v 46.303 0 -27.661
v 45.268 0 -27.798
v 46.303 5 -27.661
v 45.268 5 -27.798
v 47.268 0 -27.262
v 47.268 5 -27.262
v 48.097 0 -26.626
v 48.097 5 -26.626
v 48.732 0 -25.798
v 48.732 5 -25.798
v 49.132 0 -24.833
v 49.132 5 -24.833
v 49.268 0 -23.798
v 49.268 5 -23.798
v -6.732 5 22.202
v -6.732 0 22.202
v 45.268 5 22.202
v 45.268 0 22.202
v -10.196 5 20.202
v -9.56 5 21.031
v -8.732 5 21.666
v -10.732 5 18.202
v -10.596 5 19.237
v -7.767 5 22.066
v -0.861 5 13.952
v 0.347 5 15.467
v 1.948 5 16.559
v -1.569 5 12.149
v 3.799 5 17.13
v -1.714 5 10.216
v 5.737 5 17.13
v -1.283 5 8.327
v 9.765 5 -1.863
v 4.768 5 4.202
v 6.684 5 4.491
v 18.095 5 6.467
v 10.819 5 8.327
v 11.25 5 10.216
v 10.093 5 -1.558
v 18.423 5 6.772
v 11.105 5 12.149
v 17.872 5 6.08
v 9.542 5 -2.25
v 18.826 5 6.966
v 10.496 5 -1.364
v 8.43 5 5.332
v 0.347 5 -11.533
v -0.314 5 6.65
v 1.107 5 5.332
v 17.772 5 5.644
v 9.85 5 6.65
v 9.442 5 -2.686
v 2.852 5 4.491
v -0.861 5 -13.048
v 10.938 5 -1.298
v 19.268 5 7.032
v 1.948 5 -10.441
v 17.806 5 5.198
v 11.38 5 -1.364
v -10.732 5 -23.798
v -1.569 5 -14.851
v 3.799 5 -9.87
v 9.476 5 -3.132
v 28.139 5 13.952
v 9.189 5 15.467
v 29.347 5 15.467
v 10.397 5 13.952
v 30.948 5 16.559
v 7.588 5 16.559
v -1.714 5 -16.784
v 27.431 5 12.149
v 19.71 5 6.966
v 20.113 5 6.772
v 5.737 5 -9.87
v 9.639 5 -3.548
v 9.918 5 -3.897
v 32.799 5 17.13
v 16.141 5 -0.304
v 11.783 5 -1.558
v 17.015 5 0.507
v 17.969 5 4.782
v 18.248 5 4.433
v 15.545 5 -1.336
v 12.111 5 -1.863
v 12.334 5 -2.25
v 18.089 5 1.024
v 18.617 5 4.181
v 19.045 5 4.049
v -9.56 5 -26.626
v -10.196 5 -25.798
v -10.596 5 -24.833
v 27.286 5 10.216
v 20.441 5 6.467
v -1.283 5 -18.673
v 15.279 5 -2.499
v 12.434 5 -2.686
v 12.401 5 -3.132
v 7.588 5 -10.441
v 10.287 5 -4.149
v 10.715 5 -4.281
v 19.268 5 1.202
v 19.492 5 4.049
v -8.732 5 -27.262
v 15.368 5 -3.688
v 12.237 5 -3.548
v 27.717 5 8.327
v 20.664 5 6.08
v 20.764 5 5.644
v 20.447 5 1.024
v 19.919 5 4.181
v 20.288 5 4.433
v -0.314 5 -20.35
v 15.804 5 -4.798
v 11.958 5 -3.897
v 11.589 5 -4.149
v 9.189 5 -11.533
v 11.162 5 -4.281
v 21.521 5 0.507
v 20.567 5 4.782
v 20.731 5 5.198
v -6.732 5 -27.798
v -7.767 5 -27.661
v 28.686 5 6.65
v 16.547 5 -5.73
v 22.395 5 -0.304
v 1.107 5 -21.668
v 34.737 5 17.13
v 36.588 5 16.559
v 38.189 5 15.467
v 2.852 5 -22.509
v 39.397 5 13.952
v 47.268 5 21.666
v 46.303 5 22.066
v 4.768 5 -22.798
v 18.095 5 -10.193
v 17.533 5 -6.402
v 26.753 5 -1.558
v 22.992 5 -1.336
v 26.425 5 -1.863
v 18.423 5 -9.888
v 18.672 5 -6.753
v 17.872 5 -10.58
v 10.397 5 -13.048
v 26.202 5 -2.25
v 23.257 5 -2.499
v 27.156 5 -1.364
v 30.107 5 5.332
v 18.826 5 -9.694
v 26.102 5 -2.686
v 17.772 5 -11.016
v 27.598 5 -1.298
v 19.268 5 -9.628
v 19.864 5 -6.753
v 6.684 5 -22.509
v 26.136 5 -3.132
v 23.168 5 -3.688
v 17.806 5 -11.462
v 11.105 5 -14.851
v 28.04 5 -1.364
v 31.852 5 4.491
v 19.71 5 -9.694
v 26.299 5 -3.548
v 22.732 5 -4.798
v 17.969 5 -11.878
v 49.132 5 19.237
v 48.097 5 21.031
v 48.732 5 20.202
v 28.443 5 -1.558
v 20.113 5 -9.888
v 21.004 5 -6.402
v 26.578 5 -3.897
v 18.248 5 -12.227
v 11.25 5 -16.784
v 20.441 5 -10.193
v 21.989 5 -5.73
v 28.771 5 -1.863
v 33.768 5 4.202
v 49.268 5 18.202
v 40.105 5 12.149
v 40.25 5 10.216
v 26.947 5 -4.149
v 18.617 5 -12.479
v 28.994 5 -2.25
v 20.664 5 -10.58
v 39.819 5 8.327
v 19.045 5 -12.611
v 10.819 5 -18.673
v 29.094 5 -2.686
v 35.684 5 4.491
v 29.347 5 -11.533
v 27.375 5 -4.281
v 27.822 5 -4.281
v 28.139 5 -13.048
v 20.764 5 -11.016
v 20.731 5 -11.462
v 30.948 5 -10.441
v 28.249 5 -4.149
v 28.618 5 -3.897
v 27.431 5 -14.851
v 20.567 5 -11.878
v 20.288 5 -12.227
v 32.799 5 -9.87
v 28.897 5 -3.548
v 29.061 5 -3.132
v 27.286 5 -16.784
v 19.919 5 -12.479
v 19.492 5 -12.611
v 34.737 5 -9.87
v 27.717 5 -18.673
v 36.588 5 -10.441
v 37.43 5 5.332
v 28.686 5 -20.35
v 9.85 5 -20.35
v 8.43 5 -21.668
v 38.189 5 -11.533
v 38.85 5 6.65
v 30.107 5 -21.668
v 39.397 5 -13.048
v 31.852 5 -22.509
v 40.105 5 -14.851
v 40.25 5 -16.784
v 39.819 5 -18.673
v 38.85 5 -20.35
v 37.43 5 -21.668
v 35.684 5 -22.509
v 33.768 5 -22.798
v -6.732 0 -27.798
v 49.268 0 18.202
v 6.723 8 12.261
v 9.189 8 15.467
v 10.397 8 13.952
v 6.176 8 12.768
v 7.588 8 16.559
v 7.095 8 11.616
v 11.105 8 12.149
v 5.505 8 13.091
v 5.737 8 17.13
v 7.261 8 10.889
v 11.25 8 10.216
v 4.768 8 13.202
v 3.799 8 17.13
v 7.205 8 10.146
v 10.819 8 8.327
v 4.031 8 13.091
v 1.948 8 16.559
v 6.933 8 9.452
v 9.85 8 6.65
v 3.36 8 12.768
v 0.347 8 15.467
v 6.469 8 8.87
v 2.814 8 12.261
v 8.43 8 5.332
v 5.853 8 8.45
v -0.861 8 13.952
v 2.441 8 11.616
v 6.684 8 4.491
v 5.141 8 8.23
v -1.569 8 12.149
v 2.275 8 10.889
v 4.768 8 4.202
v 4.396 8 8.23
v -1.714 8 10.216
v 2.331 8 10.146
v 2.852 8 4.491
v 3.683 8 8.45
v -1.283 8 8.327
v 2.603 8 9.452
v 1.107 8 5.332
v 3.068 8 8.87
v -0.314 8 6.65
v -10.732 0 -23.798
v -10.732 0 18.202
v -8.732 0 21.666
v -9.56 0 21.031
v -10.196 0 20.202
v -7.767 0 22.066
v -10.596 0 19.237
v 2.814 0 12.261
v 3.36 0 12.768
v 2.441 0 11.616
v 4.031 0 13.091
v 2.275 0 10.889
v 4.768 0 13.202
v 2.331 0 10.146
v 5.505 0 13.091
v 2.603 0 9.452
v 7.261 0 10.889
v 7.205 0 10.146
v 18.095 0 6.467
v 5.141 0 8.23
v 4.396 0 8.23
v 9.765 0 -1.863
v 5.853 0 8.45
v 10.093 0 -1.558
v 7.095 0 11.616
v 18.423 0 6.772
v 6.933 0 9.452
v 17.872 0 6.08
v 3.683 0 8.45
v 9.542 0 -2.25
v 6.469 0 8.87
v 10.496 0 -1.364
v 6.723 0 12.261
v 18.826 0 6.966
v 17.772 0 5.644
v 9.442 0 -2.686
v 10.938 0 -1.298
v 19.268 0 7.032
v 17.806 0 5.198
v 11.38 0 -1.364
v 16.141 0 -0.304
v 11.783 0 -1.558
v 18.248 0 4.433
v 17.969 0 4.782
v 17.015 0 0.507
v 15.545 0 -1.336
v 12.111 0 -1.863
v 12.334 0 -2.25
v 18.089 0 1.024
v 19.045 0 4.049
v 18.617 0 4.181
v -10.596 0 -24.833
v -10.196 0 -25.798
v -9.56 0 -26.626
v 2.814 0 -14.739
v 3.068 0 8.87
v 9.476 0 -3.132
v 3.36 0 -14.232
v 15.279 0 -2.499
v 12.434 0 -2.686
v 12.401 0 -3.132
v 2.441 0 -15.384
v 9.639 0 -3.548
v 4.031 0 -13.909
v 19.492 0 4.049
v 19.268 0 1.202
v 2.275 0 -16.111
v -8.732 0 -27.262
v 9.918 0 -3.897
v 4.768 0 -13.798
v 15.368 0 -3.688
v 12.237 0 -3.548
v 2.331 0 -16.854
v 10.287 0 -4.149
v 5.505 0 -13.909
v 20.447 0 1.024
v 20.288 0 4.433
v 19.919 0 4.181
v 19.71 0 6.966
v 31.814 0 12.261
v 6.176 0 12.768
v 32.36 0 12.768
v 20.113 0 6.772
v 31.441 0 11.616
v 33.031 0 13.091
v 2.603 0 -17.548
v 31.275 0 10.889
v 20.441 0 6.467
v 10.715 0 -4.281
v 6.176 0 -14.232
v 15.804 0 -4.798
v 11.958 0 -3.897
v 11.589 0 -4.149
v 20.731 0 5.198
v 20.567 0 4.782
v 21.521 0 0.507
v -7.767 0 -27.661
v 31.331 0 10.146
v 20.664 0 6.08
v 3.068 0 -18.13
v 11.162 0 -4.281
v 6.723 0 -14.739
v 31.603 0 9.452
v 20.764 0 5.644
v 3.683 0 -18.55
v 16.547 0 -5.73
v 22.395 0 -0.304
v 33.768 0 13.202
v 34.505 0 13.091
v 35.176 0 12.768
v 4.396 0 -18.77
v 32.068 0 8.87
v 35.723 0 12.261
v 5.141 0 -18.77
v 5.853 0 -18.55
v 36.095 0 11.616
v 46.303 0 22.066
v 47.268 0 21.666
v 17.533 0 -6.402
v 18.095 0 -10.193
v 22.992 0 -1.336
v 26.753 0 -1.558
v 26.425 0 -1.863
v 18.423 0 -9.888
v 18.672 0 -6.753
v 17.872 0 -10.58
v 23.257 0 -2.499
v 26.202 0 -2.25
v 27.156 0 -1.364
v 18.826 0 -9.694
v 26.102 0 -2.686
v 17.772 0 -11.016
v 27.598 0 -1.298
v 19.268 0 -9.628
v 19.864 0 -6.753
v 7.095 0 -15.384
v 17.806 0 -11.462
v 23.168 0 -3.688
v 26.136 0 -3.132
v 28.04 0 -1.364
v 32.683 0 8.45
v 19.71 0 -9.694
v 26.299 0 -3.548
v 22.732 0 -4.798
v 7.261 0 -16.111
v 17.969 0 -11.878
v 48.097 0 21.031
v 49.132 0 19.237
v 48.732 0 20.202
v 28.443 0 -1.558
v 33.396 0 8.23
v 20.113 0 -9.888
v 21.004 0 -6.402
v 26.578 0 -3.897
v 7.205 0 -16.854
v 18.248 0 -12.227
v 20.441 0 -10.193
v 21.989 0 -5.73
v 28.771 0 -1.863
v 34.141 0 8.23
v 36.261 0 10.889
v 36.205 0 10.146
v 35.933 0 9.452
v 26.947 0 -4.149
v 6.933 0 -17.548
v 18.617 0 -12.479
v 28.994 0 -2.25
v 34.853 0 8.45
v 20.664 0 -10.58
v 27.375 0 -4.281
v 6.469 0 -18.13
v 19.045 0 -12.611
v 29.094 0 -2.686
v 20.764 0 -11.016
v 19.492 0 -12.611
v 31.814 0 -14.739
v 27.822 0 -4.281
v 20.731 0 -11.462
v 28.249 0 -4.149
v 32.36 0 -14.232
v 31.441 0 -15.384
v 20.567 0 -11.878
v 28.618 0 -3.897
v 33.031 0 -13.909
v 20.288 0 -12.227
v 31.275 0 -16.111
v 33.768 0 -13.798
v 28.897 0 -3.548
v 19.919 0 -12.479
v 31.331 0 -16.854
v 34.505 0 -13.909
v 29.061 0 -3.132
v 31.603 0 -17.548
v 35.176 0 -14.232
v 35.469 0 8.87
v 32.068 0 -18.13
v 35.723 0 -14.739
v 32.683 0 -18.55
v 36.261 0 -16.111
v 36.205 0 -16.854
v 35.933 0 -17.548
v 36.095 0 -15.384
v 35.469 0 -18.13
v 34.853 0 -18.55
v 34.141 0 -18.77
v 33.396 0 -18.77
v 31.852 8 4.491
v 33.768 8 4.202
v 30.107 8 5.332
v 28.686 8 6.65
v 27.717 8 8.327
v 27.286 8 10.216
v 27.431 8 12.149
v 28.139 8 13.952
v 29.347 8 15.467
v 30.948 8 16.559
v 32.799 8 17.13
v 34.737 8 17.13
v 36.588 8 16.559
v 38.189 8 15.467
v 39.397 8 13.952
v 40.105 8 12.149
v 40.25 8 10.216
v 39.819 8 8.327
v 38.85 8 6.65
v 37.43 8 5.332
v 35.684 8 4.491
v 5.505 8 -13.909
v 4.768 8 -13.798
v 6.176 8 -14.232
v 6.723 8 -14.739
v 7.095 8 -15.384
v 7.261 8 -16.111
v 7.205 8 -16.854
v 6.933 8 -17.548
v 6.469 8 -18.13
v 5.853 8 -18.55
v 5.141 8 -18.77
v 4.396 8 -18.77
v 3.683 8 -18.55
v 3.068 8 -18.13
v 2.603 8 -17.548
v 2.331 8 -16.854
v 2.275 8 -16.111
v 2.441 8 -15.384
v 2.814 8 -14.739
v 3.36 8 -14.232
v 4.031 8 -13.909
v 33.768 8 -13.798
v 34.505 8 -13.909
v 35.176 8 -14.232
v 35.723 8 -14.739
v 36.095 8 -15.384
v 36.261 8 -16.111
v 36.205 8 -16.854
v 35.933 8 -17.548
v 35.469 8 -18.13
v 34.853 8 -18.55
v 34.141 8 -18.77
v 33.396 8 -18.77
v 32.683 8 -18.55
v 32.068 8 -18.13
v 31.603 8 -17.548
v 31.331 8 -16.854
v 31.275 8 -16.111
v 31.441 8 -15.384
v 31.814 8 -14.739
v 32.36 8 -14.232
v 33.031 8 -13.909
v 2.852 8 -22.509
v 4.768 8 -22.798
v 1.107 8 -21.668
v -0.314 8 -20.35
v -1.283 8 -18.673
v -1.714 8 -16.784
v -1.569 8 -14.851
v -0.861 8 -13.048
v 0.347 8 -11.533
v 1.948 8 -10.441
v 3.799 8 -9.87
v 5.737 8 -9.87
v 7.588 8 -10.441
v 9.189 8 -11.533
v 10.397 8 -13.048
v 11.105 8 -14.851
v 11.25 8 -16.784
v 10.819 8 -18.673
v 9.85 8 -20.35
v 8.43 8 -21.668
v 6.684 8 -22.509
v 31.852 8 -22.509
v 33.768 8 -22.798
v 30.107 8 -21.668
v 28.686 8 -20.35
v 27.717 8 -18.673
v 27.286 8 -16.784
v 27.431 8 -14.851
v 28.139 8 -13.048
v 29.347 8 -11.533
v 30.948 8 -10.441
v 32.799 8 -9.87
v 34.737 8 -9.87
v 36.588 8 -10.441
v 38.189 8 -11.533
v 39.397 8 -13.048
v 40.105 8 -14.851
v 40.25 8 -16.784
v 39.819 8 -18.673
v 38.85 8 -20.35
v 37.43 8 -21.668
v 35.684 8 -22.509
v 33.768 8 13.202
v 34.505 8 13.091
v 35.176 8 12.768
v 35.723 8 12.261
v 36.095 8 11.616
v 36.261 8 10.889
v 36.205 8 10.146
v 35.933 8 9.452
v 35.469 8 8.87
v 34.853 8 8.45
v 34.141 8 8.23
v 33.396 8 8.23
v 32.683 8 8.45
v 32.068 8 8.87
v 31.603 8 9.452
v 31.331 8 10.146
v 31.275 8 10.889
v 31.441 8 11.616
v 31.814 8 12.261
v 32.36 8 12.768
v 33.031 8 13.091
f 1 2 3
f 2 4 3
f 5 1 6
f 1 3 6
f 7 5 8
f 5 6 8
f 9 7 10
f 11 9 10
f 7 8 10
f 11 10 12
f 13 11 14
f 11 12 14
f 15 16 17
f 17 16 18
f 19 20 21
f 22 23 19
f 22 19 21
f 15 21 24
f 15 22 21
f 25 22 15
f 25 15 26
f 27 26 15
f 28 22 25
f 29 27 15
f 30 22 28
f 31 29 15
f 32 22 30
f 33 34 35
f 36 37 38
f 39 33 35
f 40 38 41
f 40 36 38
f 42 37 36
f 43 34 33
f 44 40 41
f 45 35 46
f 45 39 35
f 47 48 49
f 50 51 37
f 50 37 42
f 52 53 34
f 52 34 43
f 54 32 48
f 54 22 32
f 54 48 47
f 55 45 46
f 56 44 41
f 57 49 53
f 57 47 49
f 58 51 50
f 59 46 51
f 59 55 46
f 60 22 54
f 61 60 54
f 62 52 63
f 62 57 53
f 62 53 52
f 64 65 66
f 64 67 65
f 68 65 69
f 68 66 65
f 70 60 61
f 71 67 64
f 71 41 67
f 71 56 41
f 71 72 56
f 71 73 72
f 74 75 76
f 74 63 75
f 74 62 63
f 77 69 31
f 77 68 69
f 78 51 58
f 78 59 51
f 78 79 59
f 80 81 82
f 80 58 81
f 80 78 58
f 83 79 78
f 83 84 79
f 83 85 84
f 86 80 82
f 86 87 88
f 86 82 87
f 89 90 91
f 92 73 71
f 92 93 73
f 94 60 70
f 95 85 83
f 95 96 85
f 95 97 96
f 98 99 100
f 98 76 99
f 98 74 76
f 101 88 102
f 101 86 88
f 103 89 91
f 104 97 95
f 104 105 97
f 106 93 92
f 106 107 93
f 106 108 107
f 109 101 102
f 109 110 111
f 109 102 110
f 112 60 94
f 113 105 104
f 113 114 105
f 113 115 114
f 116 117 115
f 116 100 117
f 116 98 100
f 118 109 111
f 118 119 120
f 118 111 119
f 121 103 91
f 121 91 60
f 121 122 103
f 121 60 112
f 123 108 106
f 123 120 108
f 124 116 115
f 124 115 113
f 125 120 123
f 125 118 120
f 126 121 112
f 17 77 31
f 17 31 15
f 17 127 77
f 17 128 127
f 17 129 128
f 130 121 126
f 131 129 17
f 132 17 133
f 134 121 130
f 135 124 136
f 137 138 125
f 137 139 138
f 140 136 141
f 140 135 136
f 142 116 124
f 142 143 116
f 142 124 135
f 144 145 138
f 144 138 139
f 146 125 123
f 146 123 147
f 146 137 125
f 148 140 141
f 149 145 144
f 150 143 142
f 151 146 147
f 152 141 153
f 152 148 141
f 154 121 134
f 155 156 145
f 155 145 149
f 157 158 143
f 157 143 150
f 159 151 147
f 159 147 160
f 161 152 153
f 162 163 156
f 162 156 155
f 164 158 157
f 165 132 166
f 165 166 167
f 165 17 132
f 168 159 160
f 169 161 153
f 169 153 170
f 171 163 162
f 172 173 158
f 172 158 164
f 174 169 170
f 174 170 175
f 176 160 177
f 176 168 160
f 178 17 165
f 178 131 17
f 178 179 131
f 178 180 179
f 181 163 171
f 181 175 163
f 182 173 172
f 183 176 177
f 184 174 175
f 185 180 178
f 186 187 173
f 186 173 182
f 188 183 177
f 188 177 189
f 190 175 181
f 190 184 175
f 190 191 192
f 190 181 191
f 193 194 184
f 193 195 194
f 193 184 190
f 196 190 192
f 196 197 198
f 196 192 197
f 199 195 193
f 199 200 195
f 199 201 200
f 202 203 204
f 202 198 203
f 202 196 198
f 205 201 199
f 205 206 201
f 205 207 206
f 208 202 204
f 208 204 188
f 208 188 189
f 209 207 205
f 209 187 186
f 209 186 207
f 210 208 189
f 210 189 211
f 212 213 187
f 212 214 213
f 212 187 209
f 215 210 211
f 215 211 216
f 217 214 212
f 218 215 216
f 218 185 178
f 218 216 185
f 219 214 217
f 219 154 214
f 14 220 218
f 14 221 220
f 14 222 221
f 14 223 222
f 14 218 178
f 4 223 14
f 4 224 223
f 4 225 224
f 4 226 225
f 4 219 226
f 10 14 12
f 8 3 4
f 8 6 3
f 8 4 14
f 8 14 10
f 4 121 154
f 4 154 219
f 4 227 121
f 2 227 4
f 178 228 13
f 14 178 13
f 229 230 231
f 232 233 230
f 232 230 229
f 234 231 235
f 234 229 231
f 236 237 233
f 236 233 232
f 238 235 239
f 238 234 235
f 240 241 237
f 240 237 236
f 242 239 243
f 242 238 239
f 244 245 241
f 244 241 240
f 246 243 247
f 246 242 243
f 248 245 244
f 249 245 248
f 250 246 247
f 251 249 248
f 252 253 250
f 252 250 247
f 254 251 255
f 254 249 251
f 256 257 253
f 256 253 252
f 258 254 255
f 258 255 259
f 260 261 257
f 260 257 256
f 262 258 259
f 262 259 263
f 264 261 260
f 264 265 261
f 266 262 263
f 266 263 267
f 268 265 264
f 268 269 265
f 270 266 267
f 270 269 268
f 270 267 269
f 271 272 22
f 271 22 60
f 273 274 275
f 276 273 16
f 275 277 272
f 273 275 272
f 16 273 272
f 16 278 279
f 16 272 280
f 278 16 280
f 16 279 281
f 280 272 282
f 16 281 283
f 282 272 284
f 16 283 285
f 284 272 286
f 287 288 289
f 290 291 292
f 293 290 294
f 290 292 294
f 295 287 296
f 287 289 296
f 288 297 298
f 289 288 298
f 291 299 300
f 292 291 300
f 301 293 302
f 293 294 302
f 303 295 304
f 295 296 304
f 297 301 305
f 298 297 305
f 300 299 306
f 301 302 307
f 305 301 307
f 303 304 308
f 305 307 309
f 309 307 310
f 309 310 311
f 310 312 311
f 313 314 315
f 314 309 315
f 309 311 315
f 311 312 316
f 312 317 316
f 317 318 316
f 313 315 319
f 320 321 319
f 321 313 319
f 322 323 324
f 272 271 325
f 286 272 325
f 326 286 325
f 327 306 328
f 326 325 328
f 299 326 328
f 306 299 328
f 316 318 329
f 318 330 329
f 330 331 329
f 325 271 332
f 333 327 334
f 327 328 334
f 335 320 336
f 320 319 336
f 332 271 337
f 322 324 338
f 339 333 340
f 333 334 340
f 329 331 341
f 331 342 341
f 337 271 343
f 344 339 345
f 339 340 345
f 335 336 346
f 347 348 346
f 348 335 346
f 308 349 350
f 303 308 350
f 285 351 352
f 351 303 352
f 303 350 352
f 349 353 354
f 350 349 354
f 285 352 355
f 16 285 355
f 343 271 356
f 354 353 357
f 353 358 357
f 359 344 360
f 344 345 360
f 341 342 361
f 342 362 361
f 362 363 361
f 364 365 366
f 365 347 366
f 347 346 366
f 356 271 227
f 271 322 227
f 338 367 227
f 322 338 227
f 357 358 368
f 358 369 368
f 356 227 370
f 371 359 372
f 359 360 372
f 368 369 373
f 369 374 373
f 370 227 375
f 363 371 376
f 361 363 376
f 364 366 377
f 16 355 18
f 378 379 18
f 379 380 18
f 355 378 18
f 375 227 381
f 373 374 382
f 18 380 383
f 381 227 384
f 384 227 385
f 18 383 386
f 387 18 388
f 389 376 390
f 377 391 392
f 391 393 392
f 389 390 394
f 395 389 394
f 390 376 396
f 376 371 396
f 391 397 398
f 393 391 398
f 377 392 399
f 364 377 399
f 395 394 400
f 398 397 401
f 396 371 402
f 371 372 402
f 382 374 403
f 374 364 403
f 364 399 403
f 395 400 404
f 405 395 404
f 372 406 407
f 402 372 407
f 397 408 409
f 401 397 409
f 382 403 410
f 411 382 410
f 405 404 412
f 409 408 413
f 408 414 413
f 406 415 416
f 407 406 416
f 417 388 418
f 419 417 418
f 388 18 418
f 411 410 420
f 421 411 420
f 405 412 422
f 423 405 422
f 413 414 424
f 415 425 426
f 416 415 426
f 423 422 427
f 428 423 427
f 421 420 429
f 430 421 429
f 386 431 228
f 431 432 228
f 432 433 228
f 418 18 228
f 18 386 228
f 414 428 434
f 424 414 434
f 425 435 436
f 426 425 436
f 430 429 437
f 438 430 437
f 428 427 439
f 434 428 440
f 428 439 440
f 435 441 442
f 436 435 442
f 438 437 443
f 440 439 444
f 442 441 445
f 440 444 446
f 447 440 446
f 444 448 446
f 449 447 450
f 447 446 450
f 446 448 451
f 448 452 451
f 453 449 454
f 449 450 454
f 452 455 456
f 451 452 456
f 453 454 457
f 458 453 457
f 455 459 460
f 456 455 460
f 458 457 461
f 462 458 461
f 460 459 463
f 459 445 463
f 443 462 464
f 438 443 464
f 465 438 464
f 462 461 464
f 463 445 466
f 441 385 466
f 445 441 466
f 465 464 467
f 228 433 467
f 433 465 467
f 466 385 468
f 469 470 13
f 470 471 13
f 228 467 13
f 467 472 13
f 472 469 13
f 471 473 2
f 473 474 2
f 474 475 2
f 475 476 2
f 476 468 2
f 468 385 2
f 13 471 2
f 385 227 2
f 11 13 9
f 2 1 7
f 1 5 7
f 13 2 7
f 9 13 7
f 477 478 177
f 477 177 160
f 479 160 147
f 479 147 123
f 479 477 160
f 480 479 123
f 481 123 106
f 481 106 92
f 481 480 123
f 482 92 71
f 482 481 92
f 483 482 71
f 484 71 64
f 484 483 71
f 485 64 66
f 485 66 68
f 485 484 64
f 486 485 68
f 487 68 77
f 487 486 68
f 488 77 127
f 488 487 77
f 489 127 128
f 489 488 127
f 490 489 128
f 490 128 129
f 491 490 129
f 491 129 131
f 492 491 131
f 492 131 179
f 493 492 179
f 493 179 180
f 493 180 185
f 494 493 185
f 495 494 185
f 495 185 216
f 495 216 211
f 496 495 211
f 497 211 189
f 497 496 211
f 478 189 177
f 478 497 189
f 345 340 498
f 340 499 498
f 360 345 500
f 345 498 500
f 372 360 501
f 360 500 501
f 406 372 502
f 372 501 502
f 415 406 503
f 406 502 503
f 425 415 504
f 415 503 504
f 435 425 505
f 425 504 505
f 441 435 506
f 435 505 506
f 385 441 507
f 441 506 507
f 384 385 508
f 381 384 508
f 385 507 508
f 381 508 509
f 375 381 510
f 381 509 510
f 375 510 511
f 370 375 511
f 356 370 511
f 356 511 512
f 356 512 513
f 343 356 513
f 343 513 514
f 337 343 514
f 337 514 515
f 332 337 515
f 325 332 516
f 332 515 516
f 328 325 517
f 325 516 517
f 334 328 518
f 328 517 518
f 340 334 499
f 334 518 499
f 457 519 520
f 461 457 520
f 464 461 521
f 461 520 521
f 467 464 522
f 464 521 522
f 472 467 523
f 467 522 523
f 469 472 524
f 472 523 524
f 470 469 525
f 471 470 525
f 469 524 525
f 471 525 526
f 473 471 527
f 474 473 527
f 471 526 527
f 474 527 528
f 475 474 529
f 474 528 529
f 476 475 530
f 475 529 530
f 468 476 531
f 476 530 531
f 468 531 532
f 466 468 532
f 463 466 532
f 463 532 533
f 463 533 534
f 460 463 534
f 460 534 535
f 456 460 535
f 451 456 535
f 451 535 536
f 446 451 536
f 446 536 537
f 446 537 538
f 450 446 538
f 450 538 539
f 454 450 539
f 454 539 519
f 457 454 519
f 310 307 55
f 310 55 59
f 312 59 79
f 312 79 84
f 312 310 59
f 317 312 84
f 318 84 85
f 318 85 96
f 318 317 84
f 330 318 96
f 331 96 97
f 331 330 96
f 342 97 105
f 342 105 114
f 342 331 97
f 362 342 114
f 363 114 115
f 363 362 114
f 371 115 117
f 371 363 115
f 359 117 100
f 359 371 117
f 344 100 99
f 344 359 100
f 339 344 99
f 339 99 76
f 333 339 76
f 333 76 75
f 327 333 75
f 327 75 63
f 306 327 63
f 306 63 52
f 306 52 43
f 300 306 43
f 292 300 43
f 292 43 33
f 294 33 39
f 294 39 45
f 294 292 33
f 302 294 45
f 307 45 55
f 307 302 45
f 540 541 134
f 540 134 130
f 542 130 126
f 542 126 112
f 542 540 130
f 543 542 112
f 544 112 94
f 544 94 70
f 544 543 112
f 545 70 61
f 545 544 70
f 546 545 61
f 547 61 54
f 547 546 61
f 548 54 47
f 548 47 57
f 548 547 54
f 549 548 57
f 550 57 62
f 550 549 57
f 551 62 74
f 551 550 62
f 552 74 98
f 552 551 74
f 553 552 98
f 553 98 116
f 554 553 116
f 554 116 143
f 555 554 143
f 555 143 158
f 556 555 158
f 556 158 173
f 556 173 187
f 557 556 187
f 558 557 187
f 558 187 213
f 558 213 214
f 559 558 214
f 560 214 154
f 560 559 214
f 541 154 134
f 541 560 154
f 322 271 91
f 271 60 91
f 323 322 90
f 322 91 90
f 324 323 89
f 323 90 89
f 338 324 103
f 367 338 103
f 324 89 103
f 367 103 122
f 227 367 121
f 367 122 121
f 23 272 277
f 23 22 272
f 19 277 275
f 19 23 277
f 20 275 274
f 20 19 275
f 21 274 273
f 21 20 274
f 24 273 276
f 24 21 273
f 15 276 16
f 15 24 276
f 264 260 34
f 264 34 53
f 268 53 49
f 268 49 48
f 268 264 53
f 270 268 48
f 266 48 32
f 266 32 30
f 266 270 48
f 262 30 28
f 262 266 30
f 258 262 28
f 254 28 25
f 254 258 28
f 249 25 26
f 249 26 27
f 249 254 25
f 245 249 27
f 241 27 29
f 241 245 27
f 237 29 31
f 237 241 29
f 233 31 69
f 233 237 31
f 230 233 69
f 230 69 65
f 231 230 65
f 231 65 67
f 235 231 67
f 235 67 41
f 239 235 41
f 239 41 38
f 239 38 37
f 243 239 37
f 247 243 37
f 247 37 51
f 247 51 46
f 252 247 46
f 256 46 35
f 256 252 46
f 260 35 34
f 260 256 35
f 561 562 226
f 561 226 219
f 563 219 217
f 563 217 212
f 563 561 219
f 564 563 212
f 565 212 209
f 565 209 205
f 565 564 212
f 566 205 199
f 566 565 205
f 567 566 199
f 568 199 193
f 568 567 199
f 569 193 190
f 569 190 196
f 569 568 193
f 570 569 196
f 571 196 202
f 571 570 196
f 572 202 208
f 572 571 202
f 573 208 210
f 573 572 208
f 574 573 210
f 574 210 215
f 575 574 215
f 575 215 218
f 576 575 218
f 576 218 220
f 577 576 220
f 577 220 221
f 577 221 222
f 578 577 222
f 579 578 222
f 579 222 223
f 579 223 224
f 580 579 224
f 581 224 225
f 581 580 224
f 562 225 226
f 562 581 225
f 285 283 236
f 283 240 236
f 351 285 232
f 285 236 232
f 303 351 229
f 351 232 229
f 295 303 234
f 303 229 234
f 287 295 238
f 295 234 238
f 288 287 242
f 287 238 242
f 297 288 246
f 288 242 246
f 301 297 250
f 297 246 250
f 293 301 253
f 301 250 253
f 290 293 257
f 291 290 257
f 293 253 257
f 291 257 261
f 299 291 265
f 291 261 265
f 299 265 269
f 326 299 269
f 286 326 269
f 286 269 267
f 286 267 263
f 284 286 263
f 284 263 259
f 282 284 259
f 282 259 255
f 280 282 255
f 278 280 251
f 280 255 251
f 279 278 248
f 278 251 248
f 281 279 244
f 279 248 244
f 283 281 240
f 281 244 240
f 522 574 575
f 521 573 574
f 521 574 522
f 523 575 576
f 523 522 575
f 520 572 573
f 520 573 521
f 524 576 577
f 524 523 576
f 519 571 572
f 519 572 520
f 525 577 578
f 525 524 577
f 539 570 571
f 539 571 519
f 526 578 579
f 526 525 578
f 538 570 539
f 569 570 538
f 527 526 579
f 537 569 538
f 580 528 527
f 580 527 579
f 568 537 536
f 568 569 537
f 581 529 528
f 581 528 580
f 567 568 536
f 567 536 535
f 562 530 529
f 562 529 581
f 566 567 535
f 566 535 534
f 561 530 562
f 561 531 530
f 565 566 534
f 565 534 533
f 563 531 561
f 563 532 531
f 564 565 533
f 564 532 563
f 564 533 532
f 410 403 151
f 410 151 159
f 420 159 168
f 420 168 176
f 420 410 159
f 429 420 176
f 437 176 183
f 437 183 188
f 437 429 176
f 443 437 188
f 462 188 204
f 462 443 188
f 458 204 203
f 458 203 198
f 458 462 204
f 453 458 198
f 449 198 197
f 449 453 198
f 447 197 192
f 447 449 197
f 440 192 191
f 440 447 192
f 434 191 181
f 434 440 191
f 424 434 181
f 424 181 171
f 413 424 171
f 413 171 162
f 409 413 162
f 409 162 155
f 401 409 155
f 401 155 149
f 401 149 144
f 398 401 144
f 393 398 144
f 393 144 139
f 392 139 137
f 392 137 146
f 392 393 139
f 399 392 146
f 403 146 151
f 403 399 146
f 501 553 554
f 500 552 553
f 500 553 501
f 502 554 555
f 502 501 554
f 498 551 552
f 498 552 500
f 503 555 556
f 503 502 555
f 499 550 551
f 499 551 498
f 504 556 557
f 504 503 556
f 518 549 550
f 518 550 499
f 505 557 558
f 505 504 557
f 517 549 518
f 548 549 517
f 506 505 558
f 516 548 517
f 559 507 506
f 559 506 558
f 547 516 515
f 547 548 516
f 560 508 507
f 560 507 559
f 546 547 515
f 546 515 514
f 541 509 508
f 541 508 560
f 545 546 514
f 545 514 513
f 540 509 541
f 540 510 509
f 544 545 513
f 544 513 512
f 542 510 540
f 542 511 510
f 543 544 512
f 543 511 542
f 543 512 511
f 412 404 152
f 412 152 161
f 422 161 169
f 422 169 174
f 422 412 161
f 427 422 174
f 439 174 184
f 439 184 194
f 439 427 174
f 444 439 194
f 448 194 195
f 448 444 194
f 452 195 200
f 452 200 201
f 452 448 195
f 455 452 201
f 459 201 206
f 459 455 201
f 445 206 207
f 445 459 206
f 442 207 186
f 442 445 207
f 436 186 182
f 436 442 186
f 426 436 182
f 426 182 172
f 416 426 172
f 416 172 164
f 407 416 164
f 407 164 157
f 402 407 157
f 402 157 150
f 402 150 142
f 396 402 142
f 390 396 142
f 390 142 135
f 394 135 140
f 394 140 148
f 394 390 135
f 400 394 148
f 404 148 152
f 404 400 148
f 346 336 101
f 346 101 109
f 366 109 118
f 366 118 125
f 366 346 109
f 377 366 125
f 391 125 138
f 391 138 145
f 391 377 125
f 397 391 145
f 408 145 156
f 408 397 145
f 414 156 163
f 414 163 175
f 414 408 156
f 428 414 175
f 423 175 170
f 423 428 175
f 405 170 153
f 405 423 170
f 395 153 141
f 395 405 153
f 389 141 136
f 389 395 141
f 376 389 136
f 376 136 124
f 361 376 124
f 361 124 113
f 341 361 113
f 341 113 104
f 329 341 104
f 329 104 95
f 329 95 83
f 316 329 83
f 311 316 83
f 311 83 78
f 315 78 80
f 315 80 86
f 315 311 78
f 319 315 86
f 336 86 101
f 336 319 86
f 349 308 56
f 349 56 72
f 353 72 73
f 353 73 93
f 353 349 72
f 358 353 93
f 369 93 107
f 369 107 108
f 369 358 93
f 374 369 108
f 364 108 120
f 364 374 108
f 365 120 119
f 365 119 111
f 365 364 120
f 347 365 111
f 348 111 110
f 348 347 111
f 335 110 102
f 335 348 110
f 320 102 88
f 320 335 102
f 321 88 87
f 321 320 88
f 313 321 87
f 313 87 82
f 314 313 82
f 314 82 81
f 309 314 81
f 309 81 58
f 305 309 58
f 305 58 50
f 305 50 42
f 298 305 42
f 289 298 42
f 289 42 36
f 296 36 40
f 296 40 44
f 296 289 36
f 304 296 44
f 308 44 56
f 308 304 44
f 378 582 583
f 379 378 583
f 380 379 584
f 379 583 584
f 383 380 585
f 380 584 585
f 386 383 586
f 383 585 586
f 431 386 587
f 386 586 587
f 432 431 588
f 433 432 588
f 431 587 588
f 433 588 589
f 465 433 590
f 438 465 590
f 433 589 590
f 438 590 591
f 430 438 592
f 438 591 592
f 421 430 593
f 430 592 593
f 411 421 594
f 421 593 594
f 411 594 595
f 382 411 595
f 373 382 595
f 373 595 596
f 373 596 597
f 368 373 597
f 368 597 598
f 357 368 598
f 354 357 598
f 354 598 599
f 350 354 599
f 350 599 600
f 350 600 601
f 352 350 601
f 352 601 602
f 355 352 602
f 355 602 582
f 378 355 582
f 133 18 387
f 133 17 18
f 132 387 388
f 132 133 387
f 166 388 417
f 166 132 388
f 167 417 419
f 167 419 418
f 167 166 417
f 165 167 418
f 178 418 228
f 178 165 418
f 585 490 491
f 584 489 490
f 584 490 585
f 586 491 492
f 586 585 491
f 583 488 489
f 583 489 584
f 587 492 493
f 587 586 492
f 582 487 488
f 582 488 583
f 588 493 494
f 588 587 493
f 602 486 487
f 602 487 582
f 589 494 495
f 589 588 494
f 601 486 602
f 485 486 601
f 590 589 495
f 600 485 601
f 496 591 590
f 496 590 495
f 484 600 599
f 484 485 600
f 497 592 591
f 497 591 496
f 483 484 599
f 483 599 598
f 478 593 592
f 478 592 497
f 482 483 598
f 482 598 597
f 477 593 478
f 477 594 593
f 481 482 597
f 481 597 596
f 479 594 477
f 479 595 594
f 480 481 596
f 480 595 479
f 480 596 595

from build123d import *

# Parameters (mm, degrees)
SKETCH3_W            = 60
SKETCH3_H            = 50
SKETCH3_R            = 4
SKETCH3_R_2          = 1.5
BOSS_EXTRUDE1_DEPTH  = 5
SKETCH4_R            = 2.5
CUT_EXTRUDE1_DEPTH   = 5
FILLET1_R            = 4
BOSS_EXTRUDE2_START  = 3
SKETCH5_R            = 6.5
SKETCH5_R_2          = 2.5
BOSS_EXTRUDE2_DEPTH  = 3
LPATTERN1_COUNT      = 2
LPATTERN1_PITCH      = 29
LPATTERN1_COUNT_DIR2 = 2
LPATTERN1_PITCH_DIR2 = 27


with BuildPart() as part:
    # Sketch3 → Boss-Extrude1 (new body)
    with BuildSketch(Plane(origin=(0, 0, 0), x_dir=(1, 0, 0), z_dir=(0, 1, 0))):
        with Locations((19.268140366, 2.797796233)):
            Rectangle(SKETCH3_W, SKETCH3_H)
        with Locations(Location((19.268140366, 2.797796233, 0), (0, 0, 270))):
            Circle(SKETCH3_R, mode=Mode.SUBTRACT)
        with Locations(Location((10.938140366, 2.797796233, 0), (0, 0, 270))):
            Circle(SKETCH3_R_2, mode=Mode.SUBTRACT)
        with Locations(Location((19.268140366, 11.127796233, 0), (0, 0, 270))):
            Circle(SKETCH3_R_2, mode=Mode.SUBTRACT)
        with Locations(Location((27.598140366, 2.797796233, 0), (0, 0, 270))):
            Circle(SKETCH3_R_2, mode=Mode.SUBTRACT)
        with Locations(Location((19.268140366, -5.532203767, 0), (0, 0, 270))):
            Circle(SKETCH3_R_2, mode=Mode.SUBTRACT)
    extrude(amount=BOSS_EXTRUDE1_DEPTH)

    # Sketch4 → Cut-Extrude1 (cut)
    with BuildSketch(Plane(origin=(0, 5, 0), x_dir=(1, 0, 0), z_dir=(0, 1, 0))):
        with Locations(Location((4.768140366, 16.297796233, 0), (0, 0, 270))):
            Circle(SKETCH4_R)
        with Locations(Location((33.768140366, 16.297796233, 0), (0, 0, 270))):
            Circle(SKETCH4_R)
        with Locations(Location((33.768140366, -10.702203767, 0), (0, 0, 270))):
            Circle(SKETCH4_R)
        with Locations(Location((4.768140366, -10.702203767, 0), (0, 0, 270))):
            Circle(SKETCH4_R)
    extrude(amount=-CUT_EXTRUDE1_DEPTH, mode=Mode.SUBTRACT)

    # Fillet1
    fillet1_edges = [part.edges().sort_by_distance(p)[0] for p in [
        (-10.731859634, 2.5, -27.797796233),
        (49.268140366, 2.5, -27.797796233),
        (49.268140366, 2.5, 22.202203767),
        (-10.731859634, 2.5, 22.202203767),
    ]]
    fillet(fillet1_edges, radius=FILLET1_R)

    # Sketch5 → Boss-Extrude2 (add)
    with BuildSketch(Plane(origin=(0, 5, 0), x_dir=(1, 0, 0), z_dir=(0, 1, 0)).offset(BOSS_EXTRUDE2_START)):
        with Locations(Location((33.768140366, 16.297796233, 0), (0, 0, 90))):
            Circle(SKETCH5_R)
        with Locations(Location((33.768140366, 16.297796233, 0), (0, 0, 270))):
            Circle(SKETCH5_R_2, mode=Mode.SUBTRACT)
    boss_extrude2 = extrude(amount=-BOSS_EXTRUDE2_DEPTH)

    # LPattern1: Boss-Extrude2 2 × 2
    with Locations(*[(-i * LPATTERN1_PITCH, 0, j * LPATTERN1_PITCH_DIR2) for i in range(LPATTERN1_COUNT) for j in range(LPATTERN1_COUNT_DIR2) if (i, j) != (0, 0)]):
        add(boss_extrude2)


solid = part.part
